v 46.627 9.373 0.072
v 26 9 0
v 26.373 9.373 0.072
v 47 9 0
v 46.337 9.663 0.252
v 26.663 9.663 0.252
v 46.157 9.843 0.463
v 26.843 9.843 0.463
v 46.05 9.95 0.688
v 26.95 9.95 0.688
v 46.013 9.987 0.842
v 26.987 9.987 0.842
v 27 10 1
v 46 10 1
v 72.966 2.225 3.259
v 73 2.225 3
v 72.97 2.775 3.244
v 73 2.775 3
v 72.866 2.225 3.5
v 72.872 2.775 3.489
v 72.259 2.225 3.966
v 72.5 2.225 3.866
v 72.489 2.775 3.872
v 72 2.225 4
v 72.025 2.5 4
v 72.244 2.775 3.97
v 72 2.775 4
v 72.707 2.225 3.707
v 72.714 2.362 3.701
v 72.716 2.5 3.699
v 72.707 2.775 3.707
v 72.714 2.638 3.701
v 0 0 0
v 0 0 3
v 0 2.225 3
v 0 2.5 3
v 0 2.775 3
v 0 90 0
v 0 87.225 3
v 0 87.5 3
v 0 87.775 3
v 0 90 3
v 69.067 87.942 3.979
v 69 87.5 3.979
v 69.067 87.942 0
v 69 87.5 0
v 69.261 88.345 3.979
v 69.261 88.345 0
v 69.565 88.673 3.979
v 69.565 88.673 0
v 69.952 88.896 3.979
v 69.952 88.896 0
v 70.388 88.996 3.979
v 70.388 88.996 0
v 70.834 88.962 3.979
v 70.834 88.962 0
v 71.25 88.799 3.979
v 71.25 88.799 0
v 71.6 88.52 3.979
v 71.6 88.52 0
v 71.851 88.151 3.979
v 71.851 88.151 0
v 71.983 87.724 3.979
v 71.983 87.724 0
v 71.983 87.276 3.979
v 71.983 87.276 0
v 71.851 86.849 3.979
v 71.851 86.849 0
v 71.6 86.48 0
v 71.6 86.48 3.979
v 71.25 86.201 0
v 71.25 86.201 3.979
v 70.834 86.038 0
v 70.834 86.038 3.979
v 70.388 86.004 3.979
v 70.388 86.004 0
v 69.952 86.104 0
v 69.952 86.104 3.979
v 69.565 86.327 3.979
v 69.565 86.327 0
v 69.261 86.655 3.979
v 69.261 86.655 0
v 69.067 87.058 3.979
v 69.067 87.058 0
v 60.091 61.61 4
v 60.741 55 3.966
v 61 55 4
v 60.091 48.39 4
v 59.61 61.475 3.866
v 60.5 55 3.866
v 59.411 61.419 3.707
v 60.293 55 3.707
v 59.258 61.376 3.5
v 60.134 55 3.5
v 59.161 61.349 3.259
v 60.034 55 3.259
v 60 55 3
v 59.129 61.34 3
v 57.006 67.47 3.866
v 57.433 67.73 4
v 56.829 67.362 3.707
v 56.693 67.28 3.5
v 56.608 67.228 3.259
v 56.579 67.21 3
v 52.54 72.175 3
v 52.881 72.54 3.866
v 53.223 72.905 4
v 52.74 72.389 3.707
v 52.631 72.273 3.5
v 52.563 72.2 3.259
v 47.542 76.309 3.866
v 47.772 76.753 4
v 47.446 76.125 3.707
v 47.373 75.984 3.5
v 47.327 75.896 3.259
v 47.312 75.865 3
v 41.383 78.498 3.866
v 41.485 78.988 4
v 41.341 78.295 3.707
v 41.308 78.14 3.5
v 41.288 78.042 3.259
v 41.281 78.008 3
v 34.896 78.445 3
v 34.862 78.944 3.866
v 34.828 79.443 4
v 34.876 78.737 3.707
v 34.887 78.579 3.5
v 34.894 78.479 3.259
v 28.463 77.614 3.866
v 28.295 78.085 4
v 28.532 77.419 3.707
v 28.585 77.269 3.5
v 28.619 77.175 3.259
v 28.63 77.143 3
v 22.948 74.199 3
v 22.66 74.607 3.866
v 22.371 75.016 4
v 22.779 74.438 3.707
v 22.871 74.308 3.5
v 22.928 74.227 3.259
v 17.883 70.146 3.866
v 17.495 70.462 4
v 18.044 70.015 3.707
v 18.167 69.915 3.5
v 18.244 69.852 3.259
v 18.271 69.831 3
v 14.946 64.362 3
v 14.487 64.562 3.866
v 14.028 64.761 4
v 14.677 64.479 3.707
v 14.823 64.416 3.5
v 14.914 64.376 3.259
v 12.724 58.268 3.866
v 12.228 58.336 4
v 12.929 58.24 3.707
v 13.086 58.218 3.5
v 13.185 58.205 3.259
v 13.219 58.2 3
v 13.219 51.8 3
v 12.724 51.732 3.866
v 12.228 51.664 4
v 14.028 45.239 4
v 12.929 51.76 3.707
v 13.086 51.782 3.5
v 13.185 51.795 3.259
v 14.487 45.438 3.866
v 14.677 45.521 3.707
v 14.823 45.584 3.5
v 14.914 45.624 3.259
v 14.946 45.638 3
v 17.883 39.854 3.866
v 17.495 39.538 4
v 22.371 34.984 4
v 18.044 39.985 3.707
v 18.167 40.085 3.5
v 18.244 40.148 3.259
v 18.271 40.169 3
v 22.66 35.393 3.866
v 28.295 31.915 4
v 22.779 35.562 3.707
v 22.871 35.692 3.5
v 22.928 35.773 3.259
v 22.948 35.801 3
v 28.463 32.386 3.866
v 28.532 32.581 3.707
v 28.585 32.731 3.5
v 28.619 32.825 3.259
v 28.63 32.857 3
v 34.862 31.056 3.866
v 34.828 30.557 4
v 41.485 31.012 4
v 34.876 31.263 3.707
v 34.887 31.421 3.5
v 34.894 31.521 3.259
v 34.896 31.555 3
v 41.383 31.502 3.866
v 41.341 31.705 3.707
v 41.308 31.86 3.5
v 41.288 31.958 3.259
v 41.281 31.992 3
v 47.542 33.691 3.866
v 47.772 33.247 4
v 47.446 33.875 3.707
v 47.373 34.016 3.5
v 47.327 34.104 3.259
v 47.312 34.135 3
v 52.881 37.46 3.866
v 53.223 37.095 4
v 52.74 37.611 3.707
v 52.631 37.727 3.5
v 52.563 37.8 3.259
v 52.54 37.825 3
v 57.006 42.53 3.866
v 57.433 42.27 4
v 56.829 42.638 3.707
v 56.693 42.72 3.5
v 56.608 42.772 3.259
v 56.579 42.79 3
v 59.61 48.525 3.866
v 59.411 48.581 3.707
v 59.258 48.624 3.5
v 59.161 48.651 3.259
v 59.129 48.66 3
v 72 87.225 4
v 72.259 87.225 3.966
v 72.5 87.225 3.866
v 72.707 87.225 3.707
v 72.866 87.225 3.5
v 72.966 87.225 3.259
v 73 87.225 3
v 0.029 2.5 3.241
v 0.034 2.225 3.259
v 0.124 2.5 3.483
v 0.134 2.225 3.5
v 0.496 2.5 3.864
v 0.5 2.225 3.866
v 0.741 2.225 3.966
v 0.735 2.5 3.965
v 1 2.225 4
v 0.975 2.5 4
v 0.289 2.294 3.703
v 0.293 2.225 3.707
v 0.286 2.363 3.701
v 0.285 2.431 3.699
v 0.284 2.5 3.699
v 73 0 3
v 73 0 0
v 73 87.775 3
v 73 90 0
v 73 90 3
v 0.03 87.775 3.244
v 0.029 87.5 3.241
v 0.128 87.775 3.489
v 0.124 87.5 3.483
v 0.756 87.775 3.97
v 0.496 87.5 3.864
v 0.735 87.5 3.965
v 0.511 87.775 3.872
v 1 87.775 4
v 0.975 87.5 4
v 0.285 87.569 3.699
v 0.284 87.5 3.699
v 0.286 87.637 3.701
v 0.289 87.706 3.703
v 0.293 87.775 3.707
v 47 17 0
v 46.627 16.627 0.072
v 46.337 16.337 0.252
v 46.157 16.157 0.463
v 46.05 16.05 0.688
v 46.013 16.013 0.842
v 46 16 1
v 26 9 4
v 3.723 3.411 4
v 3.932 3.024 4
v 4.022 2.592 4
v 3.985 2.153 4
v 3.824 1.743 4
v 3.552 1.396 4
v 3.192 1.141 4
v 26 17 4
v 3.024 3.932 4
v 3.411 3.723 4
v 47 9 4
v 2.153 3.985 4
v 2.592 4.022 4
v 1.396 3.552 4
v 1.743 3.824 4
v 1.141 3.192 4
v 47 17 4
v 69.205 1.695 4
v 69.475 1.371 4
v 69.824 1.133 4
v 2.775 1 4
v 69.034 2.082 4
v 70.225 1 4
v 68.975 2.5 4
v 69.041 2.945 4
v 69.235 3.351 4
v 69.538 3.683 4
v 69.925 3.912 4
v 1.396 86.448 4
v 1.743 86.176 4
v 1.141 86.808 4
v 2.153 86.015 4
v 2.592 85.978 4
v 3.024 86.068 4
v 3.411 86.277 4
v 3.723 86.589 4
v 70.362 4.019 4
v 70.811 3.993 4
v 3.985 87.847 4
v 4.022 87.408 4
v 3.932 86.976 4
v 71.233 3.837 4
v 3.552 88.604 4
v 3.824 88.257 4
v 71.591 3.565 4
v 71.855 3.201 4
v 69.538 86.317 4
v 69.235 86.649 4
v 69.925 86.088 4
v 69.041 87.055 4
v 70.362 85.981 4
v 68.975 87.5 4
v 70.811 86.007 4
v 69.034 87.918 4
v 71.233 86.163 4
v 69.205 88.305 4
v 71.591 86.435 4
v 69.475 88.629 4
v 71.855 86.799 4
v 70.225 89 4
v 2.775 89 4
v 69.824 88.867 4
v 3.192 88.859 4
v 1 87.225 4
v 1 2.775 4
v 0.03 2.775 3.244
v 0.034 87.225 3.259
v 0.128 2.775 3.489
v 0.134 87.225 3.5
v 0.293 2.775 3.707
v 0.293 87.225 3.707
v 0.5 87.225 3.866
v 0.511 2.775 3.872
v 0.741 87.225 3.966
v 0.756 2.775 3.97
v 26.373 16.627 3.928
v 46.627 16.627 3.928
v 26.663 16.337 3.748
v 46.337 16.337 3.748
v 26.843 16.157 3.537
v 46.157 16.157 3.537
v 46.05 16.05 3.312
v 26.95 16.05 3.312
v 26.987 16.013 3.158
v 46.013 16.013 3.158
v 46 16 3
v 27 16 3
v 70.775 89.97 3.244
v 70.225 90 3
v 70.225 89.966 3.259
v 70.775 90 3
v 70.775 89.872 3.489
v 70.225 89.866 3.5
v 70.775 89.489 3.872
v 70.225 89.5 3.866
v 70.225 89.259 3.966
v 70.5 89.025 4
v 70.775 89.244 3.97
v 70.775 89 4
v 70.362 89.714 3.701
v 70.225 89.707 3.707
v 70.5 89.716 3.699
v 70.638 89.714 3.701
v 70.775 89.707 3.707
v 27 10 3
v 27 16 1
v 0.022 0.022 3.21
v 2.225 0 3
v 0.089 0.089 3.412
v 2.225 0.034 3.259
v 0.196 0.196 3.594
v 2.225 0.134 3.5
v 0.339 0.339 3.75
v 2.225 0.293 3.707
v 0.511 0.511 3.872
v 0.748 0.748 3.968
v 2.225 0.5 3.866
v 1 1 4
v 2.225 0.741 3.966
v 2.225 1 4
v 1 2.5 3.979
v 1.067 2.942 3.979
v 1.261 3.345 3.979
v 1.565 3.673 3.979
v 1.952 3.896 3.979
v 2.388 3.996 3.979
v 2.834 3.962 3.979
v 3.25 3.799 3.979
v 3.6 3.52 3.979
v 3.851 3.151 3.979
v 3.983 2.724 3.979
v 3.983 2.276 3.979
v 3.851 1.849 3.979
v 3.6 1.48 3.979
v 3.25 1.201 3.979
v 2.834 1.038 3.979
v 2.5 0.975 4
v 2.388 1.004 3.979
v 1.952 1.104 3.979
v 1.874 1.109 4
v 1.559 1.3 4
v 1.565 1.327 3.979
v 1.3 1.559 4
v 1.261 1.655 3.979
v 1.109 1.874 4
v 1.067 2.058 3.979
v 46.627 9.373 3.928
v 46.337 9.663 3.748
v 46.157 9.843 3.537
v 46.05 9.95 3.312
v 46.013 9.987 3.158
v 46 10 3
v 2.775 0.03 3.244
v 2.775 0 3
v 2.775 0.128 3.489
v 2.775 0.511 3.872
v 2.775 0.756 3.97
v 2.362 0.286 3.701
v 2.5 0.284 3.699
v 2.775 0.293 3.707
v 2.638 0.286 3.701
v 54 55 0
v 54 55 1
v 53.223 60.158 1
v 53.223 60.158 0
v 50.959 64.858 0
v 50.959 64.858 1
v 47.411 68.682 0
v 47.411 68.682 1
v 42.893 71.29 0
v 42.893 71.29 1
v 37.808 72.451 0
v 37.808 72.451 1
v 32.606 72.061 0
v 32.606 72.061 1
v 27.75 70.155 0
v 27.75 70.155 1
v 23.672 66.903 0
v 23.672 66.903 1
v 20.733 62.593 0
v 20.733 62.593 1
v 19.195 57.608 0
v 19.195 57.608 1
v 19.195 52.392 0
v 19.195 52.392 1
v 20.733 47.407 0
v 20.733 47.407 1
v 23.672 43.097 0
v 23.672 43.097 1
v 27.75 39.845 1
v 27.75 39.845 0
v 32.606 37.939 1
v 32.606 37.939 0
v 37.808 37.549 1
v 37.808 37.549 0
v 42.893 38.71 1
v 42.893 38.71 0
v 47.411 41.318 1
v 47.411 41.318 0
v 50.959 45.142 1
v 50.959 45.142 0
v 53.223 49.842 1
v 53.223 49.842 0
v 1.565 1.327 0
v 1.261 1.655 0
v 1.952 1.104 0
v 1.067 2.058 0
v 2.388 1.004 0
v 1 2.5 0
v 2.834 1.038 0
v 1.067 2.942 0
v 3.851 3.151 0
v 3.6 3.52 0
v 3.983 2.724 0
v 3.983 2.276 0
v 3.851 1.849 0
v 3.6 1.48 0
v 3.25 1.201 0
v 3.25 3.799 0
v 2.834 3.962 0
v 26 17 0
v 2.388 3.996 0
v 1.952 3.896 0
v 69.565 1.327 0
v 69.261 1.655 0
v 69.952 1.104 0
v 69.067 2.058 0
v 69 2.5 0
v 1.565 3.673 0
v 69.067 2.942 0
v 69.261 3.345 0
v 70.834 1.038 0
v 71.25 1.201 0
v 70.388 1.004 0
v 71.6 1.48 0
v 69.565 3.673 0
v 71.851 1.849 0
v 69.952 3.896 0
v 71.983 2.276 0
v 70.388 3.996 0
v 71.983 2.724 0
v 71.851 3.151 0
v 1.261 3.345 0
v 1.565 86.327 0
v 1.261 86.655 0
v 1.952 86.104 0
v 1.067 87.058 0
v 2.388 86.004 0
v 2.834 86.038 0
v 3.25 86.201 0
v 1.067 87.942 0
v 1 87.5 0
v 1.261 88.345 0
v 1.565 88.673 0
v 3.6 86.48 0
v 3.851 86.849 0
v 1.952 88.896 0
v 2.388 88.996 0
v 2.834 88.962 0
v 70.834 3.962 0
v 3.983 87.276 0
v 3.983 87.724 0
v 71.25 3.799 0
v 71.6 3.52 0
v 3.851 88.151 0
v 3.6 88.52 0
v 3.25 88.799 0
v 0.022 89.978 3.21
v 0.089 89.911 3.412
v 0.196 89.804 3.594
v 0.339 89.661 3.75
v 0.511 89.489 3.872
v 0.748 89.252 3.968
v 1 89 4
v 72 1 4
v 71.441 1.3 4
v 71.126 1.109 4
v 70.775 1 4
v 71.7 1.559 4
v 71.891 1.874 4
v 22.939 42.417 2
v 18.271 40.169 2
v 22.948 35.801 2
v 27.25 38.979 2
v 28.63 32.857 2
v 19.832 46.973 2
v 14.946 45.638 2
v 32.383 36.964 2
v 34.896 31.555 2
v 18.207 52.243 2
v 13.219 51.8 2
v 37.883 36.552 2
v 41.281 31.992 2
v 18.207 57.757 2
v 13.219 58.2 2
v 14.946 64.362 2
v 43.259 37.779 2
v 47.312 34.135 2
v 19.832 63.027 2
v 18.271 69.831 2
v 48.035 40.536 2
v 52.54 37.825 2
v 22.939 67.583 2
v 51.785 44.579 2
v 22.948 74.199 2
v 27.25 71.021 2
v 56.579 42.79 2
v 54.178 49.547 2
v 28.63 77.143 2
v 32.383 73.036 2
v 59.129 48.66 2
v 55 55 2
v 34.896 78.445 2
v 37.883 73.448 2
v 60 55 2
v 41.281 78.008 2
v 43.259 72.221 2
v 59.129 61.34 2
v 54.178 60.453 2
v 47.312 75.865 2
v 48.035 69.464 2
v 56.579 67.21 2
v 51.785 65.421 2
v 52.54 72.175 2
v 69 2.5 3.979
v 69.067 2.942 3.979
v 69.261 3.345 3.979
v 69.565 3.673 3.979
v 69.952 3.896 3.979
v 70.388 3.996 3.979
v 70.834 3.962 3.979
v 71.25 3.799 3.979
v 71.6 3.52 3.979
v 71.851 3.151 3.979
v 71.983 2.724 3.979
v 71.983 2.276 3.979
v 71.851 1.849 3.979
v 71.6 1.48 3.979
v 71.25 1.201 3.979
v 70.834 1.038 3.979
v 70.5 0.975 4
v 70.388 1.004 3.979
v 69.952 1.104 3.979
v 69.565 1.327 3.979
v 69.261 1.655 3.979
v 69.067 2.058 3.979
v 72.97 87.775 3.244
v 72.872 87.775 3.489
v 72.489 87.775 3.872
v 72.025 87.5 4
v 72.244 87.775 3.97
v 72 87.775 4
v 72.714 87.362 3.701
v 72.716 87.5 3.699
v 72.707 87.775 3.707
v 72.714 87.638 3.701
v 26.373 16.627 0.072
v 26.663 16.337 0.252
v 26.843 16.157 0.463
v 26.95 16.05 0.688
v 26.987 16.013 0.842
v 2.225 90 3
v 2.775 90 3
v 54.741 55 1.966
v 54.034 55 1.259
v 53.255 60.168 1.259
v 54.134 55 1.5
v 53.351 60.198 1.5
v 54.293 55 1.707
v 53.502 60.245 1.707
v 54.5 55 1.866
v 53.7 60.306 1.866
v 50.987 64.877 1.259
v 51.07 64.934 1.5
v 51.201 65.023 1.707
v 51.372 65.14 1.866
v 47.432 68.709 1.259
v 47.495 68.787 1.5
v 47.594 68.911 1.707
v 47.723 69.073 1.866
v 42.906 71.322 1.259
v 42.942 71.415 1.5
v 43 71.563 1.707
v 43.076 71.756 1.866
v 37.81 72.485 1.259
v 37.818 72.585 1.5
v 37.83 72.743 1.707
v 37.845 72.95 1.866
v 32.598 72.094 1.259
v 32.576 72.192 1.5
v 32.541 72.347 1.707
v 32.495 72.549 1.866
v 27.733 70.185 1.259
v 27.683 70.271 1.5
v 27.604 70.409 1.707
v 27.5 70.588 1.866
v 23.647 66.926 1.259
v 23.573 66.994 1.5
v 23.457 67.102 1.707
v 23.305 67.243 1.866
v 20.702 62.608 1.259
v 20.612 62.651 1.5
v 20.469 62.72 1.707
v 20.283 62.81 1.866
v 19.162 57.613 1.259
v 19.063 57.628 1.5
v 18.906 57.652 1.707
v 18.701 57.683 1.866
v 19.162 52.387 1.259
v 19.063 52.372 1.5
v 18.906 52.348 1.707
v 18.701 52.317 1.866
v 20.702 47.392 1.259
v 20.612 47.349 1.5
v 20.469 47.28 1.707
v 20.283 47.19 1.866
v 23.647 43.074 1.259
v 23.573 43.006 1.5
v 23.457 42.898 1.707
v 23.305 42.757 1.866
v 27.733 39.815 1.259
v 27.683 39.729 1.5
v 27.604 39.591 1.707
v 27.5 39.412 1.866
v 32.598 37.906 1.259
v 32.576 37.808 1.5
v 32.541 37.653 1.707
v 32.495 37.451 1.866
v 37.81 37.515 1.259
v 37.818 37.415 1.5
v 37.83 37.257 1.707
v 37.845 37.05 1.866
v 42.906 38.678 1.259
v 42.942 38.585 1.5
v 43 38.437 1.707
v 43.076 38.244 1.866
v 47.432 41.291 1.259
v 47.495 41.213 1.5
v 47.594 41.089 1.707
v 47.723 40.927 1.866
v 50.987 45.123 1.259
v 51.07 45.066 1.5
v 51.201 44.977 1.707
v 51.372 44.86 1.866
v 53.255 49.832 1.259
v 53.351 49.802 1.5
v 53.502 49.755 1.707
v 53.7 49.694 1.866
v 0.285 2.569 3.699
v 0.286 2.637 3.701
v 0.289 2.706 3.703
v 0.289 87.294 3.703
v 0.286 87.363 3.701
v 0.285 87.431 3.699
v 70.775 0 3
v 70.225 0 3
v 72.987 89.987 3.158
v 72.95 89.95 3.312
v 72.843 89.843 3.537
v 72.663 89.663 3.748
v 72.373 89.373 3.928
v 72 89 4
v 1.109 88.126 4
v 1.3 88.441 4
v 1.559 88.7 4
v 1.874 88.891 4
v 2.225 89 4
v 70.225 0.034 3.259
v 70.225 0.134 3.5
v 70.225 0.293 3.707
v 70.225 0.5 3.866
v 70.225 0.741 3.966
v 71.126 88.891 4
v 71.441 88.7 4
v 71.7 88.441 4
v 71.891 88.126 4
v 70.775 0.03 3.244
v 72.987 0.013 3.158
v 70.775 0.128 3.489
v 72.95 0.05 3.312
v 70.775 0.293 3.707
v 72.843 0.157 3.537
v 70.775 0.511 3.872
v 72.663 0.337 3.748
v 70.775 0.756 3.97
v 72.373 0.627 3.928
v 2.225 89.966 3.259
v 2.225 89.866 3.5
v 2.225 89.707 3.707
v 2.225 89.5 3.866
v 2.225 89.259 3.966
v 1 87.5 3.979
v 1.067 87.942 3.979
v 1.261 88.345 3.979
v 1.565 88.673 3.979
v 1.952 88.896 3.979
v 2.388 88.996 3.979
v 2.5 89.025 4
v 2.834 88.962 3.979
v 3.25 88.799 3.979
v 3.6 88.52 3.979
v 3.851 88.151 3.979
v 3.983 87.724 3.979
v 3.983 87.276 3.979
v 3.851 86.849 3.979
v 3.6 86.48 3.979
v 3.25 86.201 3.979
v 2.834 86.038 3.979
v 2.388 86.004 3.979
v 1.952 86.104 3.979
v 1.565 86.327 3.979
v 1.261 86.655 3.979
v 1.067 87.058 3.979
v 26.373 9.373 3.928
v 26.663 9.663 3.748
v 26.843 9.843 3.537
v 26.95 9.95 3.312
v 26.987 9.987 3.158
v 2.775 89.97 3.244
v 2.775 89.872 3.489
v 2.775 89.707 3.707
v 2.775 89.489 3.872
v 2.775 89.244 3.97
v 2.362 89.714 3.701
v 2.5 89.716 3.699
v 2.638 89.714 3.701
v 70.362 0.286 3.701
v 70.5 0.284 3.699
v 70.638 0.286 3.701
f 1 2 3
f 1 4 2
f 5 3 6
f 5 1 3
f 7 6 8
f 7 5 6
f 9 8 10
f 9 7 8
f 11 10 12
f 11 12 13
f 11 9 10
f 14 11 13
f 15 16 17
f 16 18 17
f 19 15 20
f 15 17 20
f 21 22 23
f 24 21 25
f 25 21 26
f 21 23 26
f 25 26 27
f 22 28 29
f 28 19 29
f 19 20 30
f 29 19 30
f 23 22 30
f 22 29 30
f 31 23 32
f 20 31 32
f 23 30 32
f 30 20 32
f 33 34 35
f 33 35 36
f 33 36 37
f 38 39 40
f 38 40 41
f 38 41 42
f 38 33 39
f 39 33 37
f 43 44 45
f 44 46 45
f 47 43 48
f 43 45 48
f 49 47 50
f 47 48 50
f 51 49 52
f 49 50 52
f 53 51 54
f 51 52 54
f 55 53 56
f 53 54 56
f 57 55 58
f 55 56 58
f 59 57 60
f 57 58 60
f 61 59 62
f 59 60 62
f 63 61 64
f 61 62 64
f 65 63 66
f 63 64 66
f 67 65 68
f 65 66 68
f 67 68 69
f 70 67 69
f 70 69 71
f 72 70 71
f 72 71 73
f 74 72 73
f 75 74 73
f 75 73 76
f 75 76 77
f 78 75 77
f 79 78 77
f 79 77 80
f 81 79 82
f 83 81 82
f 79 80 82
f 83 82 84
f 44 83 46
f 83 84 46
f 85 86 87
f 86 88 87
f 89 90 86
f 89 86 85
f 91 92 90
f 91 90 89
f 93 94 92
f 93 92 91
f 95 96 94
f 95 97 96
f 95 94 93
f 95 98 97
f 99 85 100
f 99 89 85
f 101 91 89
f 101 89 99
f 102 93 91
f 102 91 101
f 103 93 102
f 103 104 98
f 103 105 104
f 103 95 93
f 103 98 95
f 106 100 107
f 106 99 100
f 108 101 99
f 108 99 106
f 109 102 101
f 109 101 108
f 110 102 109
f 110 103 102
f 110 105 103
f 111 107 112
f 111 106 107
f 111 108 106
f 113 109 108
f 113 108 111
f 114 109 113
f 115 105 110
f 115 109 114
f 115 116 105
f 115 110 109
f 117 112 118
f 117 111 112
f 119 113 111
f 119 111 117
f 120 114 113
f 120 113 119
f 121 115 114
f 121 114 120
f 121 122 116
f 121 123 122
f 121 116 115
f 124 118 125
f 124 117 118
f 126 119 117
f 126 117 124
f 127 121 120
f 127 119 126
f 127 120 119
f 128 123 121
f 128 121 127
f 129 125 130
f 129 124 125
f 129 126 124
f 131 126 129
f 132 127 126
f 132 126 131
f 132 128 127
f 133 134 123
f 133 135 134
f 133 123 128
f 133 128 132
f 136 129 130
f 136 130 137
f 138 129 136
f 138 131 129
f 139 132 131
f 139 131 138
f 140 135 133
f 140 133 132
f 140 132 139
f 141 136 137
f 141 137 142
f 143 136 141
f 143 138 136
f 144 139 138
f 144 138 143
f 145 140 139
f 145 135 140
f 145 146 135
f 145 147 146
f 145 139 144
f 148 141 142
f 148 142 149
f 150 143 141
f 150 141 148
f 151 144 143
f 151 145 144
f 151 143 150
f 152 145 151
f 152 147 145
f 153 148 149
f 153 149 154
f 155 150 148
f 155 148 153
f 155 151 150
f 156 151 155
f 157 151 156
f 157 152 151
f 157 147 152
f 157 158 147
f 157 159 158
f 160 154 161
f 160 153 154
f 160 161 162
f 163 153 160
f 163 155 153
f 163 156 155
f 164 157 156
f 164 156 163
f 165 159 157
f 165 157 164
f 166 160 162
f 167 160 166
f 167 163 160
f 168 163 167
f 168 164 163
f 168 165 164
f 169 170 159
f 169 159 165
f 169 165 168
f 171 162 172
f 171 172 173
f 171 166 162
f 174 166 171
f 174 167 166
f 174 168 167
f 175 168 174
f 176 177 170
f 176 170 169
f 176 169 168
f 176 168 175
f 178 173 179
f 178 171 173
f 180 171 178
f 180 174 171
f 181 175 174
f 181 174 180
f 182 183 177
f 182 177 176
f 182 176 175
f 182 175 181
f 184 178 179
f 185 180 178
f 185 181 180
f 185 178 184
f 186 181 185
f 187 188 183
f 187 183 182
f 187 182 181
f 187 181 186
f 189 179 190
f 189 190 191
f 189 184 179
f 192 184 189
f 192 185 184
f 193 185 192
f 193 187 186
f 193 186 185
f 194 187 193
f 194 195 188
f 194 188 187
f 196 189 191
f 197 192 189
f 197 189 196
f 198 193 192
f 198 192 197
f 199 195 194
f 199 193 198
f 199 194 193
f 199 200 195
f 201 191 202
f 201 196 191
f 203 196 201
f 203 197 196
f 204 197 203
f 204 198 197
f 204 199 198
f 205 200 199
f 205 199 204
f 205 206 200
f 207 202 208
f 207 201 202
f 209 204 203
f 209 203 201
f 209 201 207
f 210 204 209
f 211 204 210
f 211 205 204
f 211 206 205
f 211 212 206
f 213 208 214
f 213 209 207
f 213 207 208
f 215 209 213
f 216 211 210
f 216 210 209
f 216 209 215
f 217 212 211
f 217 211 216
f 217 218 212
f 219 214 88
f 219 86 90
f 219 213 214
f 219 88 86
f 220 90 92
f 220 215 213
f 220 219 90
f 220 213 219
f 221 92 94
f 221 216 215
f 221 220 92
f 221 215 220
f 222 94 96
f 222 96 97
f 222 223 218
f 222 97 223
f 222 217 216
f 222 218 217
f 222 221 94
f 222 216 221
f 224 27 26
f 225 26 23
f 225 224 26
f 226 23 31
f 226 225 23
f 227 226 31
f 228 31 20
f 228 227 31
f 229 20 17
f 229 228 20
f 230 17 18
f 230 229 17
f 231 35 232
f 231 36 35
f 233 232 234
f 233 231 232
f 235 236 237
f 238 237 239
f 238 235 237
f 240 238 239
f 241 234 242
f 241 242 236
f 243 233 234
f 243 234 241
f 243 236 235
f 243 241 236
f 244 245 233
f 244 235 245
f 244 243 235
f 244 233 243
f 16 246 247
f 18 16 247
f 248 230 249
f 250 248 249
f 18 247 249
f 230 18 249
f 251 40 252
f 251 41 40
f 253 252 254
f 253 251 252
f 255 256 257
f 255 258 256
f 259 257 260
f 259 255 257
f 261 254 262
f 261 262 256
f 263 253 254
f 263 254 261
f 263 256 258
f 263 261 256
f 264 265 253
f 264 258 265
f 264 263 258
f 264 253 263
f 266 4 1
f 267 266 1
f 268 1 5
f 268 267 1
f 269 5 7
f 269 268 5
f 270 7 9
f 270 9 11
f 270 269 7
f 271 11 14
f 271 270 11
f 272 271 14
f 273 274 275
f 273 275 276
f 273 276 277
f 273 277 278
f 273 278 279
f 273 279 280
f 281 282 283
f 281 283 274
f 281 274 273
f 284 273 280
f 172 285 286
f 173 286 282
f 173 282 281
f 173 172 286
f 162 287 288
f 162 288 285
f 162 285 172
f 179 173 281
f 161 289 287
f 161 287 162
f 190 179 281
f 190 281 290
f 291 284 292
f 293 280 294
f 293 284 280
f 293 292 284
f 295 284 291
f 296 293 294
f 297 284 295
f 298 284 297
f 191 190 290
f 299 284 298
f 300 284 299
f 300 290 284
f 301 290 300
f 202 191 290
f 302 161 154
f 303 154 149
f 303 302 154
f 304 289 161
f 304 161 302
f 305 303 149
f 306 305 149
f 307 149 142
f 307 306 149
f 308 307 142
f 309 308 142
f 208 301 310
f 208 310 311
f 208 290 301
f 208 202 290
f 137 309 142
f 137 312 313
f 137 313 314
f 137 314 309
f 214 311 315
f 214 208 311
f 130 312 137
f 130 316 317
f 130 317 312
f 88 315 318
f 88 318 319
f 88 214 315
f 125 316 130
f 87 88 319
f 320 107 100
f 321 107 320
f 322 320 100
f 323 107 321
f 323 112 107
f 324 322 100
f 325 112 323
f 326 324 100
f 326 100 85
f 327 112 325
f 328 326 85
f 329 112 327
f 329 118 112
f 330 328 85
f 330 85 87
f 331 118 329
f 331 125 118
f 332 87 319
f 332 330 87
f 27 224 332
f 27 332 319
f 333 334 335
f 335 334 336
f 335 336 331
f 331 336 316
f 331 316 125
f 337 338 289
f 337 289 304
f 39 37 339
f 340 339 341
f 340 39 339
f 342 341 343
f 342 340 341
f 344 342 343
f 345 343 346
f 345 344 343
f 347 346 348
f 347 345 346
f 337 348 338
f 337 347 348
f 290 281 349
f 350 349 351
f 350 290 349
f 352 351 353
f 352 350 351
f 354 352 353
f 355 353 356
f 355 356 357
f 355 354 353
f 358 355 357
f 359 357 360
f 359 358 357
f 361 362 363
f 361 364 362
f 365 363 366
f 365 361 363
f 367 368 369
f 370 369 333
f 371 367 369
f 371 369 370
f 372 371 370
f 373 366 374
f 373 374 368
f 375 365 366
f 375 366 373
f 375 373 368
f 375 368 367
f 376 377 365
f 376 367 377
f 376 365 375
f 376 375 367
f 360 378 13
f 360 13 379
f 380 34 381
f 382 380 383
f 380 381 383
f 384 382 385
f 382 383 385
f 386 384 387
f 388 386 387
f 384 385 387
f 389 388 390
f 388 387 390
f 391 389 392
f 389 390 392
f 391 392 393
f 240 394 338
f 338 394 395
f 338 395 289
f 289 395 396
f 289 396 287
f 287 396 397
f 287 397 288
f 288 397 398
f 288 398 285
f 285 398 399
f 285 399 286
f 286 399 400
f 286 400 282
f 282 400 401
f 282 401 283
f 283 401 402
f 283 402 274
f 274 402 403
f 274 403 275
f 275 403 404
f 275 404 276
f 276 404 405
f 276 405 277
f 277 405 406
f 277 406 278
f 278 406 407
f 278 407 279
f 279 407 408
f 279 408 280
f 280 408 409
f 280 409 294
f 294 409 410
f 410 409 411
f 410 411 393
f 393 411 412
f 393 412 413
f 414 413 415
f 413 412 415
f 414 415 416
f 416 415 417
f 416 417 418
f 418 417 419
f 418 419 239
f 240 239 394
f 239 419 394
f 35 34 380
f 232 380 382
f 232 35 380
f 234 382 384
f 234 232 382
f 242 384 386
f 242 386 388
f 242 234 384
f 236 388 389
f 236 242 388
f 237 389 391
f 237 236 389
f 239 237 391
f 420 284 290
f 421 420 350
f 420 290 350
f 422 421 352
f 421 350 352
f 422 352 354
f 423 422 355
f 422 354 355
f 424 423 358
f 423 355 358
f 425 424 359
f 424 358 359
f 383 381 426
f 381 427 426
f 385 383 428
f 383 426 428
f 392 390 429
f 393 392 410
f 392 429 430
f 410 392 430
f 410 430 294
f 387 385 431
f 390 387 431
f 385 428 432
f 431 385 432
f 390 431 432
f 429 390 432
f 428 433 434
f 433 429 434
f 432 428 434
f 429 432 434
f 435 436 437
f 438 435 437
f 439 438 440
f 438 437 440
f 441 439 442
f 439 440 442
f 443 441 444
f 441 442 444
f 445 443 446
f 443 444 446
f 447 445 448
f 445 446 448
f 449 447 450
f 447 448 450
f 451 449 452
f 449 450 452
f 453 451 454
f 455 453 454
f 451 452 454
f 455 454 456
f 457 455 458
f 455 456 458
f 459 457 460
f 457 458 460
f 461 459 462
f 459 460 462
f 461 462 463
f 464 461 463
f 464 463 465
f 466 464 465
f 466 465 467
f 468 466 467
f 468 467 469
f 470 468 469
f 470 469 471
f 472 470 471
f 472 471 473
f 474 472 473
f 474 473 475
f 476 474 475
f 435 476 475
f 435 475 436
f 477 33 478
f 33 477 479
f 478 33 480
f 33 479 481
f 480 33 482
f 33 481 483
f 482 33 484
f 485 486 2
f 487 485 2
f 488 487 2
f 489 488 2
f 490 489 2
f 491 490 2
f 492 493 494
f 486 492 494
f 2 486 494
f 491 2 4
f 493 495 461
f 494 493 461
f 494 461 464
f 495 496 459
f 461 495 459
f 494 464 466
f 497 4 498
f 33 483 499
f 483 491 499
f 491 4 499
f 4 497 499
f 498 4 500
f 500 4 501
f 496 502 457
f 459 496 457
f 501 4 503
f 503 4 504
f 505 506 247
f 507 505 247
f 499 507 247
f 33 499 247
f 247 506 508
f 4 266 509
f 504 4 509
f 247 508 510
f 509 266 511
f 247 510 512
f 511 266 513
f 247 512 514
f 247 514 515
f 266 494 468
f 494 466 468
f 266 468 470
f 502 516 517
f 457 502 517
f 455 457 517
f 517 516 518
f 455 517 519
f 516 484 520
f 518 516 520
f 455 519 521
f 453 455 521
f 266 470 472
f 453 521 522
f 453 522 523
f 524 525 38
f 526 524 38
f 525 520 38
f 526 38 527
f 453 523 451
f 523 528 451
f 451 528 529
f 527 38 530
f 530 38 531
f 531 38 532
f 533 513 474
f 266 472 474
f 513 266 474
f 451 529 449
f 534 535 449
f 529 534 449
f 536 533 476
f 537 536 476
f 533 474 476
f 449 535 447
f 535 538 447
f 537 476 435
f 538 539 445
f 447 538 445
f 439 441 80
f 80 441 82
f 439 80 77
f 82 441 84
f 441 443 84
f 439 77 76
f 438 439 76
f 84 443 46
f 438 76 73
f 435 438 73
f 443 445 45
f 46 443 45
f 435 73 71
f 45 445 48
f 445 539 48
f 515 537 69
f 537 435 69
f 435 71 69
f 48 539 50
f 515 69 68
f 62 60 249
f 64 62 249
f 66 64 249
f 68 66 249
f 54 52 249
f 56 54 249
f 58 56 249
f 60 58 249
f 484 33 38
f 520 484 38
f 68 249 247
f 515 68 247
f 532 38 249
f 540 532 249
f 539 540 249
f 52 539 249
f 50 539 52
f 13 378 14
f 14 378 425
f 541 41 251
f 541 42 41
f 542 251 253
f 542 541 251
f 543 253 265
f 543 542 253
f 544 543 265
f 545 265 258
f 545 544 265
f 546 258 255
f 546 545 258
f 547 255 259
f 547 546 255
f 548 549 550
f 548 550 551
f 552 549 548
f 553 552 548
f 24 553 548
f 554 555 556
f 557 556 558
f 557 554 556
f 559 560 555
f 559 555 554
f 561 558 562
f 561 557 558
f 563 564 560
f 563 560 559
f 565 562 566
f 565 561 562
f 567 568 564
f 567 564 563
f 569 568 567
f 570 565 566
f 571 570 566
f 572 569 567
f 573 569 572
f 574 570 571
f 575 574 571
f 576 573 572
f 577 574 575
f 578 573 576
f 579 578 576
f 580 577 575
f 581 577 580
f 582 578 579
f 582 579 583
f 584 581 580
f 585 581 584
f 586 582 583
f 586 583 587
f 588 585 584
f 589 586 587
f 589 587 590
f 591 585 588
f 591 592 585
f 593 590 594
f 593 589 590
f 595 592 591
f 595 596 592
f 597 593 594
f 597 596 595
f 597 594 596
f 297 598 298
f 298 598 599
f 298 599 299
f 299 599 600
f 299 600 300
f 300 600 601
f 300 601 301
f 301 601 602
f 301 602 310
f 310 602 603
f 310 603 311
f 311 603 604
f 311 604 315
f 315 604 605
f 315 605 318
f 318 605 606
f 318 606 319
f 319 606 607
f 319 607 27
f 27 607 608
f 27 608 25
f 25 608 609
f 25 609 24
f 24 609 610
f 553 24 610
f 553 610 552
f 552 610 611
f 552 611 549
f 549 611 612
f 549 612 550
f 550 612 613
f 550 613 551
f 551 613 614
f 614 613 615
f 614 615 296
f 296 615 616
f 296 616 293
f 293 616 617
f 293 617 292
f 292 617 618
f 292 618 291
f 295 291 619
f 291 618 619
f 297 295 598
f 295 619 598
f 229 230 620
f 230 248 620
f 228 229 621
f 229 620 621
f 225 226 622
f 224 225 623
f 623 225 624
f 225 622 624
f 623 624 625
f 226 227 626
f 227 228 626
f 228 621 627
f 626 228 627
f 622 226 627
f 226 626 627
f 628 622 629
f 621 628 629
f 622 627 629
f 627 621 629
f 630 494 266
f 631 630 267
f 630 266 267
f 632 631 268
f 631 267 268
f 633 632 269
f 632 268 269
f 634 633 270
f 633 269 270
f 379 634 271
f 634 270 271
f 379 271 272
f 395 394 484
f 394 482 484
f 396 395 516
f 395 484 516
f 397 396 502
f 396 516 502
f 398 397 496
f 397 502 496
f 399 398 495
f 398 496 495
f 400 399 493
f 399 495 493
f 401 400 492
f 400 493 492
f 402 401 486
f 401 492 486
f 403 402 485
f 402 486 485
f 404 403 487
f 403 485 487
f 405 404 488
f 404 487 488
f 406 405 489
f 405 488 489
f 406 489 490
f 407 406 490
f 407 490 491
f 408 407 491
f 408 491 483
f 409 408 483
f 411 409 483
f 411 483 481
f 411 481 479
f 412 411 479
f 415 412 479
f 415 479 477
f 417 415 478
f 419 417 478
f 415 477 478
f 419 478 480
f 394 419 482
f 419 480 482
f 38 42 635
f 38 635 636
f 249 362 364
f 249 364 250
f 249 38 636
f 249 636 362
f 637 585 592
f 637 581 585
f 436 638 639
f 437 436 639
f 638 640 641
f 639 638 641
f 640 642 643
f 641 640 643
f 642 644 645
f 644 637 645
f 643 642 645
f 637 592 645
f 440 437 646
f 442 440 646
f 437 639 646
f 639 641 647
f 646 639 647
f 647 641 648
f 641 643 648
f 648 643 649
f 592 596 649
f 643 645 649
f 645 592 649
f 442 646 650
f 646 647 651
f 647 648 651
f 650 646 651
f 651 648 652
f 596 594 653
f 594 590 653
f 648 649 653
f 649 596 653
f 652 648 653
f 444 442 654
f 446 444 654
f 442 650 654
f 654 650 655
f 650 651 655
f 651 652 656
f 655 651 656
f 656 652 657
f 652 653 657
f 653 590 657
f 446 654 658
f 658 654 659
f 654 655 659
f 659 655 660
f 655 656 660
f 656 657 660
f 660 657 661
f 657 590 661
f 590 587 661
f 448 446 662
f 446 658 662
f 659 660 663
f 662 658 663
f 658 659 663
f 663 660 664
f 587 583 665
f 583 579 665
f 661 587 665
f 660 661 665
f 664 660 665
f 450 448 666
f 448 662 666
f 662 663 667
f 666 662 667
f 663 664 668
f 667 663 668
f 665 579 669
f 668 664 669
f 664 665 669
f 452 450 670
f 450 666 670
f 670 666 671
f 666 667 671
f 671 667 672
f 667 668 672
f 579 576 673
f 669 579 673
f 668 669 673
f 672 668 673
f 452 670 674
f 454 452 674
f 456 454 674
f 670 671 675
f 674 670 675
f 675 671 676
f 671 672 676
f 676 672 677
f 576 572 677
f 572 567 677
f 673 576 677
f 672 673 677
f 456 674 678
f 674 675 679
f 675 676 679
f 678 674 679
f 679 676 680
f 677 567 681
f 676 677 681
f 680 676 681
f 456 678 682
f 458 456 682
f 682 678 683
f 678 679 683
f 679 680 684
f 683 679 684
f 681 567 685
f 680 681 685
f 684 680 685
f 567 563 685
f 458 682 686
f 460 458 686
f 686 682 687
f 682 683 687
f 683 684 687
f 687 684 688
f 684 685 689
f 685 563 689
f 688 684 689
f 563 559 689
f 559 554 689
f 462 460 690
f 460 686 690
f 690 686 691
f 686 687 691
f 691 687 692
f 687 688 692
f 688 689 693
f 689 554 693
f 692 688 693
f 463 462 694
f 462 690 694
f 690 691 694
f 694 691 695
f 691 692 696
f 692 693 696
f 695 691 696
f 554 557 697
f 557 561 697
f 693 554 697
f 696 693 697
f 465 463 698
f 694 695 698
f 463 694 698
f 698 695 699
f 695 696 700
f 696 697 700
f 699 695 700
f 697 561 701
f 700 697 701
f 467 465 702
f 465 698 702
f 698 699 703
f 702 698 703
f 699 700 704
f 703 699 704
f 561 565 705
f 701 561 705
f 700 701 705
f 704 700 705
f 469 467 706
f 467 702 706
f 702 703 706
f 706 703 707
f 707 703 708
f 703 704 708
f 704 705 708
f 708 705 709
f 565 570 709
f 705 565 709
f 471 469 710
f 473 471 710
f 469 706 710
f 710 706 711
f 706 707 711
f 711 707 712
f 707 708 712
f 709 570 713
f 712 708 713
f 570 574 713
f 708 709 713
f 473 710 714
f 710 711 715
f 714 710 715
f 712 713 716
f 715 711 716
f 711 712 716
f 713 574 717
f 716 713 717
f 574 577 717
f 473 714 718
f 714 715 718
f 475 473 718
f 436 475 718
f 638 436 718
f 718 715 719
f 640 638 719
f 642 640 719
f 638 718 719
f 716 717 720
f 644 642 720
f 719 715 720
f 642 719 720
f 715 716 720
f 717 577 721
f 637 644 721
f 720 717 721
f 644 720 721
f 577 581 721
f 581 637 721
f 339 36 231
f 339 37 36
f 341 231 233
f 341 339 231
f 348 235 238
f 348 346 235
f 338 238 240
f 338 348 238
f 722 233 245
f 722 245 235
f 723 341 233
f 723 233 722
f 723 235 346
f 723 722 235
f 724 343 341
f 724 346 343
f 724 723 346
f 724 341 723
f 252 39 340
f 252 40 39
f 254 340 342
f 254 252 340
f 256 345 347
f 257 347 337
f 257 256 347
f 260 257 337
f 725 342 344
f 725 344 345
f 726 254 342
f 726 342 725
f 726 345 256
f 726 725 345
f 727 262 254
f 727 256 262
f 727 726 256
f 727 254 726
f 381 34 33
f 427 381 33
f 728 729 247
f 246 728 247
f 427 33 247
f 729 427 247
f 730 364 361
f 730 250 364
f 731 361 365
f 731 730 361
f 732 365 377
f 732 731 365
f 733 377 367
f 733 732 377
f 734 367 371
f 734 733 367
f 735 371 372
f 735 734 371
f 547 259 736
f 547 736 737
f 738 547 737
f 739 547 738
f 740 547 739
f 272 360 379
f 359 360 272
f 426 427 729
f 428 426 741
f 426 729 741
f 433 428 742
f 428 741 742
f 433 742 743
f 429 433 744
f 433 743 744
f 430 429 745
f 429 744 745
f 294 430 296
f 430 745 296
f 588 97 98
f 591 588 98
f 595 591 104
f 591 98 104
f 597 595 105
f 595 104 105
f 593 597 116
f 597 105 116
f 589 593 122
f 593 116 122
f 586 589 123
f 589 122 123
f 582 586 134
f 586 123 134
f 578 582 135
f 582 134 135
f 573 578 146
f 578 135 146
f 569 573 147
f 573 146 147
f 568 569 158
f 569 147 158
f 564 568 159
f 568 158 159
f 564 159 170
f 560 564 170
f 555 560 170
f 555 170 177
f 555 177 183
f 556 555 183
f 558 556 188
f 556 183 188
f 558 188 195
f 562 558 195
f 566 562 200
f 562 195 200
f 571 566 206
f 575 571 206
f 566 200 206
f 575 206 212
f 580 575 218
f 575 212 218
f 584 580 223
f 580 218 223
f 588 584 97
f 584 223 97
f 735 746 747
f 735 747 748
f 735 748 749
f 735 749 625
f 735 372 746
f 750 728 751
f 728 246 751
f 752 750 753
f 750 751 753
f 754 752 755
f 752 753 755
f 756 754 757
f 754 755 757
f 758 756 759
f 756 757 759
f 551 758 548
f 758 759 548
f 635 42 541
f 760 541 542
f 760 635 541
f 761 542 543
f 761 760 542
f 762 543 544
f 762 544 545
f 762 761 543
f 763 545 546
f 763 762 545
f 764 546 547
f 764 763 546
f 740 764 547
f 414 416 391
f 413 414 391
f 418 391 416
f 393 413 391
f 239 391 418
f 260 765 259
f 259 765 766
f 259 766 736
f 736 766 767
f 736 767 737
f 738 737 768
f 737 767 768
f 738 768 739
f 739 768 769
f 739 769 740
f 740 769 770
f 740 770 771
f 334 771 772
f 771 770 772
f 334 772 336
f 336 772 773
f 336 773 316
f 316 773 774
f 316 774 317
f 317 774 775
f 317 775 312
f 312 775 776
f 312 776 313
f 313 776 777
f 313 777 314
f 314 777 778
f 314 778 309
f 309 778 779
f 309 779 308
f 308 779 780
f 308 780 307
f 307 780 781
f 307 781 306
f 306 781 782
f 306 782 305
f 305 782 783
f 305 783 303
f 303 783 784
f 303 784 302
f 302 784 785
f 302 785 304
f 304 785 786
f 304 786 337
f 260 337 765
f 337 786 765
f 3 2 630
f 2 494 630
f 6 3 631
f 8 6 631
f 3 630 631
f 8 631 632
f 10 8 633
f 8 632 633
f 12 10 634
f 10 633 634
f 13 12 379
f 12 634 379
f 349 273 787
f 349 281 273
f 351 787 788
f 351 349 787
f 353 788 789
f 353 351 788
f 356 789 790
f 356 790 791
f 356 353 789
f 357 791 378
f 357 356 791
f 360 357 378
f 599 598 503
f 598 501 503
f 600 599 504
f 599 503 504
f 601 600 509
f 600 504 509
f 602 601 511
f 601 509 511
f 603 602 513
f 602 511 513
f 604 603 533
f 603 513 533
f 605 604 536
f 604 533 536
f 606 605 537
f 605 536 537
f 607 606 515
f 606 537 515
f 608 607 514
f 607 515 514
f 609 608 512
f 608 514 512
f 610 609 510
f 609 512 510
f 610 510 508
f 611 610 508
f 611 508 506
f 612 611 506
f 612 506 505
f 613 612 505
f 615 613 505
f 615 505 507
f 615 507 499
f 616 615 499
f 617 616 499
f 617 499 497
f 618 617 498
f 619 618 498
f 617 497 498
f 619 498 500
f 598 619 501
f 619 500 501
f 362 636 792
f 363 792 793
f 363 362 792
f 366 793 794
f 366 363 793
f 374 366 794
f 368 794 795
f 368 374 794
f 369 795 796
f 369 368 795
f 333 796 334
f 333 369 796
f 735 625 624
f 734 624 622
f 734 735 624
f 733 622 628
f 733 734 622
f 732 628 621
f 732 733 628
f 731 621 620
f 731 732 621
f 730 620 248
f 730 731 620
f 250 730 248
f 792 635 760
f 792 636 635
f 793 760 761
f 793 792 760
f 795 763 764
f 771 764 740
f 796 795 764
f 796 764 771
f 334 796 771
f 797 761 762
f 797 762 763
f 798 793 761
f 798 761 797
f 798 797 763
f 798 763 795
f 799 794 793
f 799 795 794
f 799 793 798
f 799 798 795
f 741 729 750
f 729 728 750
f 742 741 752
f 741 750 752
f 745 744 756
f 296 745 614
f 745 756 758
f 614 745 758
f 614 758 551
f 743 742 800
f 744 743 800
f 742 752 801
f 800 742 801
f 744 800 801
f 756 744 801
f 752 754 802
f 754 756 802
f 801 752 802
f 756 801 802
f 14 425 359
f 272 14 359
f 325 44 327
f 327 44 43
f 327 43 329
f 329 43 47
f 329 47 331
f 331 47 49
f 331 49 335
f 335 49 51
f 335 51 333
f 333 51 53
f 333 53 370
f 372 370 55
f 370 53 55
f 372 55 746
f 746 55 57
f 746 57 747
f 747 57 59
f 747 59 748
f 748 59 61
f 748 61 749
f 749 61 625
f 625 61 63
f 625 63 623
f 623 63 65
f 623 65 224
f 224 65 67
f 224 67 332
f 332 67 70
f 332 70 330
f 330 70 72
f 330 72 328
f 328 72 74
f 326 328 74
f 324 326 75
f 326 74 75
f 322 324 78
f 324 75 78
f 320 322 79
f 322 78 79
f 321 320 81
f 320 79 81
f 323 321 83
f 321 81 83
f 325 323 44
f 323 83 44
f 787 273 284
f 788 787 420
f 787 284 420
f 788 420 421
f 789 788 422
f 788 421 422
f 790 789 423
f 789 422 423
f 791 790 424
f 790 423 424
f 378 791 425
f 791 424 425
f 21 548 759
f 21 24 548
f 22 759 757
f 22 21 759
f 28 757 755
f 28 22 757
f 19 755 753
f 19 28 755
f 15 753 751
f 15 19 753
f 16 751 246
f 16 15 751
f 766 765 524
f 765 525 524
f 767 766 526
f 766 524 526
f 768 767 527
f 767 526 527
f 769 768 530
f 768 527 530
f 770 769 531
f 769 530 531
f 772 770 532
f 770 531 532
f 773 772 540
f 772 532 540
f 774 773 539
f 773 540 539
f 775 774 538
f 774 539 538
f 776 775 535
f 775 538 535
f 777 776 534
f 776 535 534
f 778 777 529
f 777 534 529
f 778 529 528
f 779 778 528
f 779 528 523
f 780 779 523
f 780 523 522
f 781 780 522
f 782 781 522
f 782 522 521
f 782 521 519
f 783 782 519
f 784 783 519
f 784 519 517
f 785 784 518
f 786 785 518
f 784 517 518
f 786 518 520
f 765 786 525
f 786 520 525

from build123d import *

# Parameters (mm, degrees)
SKETCH_1_W          = 73
SKETCH_1_H          = 90
EXTRUDE_1_DEPTH     = 4
MM_1_D              = 3
MM_1_CSINK_D        = 3.05
MM_1_CSINK_ANGLE    = 100
SKETCH_5_R          = 17.5
CUT_EXTRUDE_3_DEPTH = 116.952576513
SKETCH_9_R          = 23.5
CUT_EXTRUDE_4_DEPTH = 2
SKETCH_10_W         = 19
SKETCH_10_H         = 6
CUT_EXTRUDE_5_DEPTH = 10
FILLET_1_R          = 1


with BuildPart() as part:
    # 草图1 → 凸台-拉伸1 (new body)
    with BuildSketch(Plane.XY):
        with Locations((36.5, 45)):
            Rectangle(SKETCH_1_W, SKETCH_1_H)
    extrude(amount=EXTRUDE_1_DEPTH)

    # 大小mm 暗销孔1 (through all)
    with Locations(Plane.XY.offset(4)):
        with Locations((2.5, 2.5), (70.5, 2.5), (70.5, 87.5), (2.5, 87.5)):
            CounterSinkHole(MM_1_D / 2, MM_1_CSINK_D / 2, counter_sink_angle=MM_1_CSINK_ANGLE)

    # 草图5 → 切除-拉伸3 (cut, through all)
    with BuildSketch(Plane.XY.offset(4)):
        with Locations((36.5, 55)):
            Circle(SKETCH_5_R)
    extrude(amount=-CUT_EXTRUDE_3_DEPTH, mode=Mode.SUBTRACT)

    # 草图9 → 切除-拉伸4 (cut)
    with BuildSketch(Plane.XY.offset(4)):
        with Locations((36.5, 55)):
            Circle(SKETCH_9_R)
    extrude(amount=-CUT_EXTRUDE_4_DEPTH, mode=Mode.SUBTRACT)

    # 草图10 → 切除-拉伸5 (cut)
    with BuildSketch(Plane.XY.offset(4)):
        with Locations((36.5, 13)):
            Rectangle(SKETCH_10_W, SKETCH_10_H)
    extrude(amount=-CUT_EXTRUDE_5_DEPTH, mode=Mode.SUBTRACT)

    # 圆角1
    fillet_1_edges = [part.edges().sort_by_distance(p)[0] for p in [
        (73, 45, 4),
        (36.5, 90, 4),
        (0, 45, 4),
        (13, 55, 4),
        (19, 55, 2),
        (36.5, 10, 0),
        (46, 13, 0),
        (36.5, 16, 0),
        (27, 13, 0),
        (27, 13, 4),
        (36.5, 10, 4),
        (46, 13, 4),
        (36.5, 16, 4),
        (36.5, 0, 4),
    ]]
    fillet(fillet_1_edges, radius=FILLET_1_R)


solid = part.part
